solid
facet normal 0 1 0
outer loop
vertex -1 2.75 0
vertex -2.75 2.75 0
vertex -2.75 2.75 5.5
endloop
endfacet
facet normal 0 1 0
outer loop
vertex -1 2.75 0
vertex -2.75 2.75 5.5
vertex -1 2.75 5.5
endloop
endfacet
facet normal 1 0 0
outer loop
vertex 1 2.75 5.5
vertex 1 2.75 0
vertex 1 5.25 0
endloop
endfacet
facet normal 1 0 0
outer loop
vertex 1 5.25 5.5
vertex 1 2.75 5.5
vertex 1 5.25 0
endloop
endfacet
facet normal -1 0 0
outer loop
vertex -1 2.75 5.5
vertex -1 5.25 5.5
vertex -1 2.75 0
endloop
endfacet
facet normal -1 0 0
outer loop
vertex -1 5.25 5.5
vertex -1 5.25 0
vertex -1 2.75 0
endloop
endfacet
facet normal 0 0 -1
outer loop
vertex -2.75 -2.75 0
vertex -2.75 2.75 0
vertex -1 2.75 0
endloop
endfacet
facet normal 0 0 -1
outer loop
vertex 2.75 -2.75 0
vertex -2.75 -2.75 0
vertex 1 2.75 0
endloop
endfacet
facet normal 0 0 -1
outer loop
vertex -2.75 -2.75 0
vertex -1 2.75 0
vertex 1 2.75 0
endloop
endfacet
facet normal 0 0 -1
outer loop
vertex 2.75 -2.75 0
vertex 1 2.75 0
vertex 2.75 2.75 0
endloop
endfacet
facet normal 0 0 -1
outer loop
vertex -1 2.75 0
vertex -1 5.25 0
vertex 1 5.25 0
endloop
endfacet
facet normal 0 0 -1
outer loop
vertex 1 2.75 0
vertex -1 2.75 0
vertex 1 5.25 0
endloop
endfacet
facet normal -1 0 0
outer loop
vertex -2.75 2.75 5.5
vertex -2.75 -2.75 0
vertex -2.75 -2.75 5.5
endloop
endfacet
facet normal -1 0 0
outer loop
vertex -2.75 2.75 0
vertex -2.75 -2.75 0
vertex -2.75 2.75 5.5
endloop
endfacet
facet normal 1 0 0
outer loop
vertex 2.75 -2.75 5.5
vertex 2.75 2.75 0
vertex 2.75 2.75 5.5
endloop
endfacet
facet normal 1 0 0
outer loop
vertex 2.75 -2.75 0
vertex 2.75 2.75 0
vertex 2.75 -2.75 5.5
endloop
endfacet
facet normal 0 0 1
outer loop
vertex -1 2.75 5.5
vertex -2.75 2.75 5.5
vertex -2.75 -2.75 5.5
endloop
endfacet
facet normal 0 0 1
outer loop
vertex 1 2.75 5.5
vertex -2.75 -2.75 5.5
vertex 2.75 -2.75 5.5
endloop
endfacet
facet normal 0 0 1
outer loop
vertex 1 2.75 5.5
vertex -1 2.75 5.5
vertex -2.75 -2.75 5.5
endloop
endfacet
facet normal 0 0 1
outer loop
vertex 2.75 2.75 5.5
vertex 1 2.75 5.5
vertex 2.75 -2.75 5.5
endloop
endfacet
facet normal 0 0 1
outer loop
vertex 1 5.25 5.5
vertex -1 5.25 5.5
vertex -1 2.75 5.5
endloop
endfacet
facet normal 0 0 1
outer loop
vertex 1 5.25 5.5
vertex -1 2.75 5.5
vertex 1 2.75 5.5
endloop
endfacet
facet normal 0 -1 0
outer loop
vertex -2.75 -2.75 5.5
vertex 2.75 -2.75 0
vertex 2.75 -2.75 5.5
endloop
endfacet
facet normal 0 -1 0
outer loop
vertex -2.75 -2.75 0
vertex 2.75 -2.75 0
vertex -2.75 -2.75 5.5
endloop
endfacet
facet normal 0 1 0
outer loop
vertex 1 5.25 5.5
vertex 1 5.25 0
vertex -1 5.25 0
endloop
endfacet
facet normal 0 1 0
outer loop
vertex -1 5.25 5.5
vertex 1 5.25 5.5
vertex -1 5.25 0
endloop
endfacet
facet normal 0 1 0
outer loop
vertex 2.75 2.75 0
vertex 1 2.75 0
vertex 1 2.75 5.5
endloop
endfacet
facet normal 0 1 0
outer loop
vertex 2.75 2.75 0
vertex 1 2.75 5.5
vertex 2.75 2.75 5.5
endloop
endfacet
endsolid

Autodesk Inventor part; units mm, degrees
ref_plane "YZ Plane" through (0, 0, 0) normal (1, 0, 0) x (0, 1, 0)
ref_plane "XZ Plane" through (0, 0, 0) normal (0, 1, 0) x (-1, 0, 0)
ref_plane "XY Plane" through (0, 0, 0) normal (0, 0, 1) x (1, 0, 0)
sketch "Sketch1" plane through (0, 0, 0) normal (0, 0, 1) x (1, 0, 0)
  line L0 (2.75, -2.75) -> (-2.75, -2.75)
  line L1 (-2.75, -2.75) -> (-2.75, 2.75)
  line L2 (-2.75, 2.75) -> (2.75, 2.75)
  line L3 (2.75, 2.75) -> (2.75, -2.75)
  line L4 (2.75, -2.75) -> (-2.75, 2.75) construction
  line L5 (-2.75, -2.75) -> (2.75, 2.75) construction
  line L6 (1, 0.25) -> (1, 5.25)
  line L7 (1, 5.25) -> (-1, 5.25)
  line L8 (-1, 5.25) -> (-1, 0.25)
  line L9 (-1, 0.25) -> (1, 0.25)
  line L10 (1, 0.25) -> (-1, 5.25) construction
  line L11 (1, 5.25) -> (-1, 0.25) construction
  point P0 (0, 0)
  point P1 (0, 2.75)
  point P2 (-1, 2.75)
  point P3 (1, 2.75)
  dimension "d0" = 5.5
  dimension "d1" = 5.5
  dimension "d2" = 2
  dimension "d3" = 5
extrude "Extrusion1" add sketch "Sketch1" along normal blind 5.5
properties part number "Agarose-block"
